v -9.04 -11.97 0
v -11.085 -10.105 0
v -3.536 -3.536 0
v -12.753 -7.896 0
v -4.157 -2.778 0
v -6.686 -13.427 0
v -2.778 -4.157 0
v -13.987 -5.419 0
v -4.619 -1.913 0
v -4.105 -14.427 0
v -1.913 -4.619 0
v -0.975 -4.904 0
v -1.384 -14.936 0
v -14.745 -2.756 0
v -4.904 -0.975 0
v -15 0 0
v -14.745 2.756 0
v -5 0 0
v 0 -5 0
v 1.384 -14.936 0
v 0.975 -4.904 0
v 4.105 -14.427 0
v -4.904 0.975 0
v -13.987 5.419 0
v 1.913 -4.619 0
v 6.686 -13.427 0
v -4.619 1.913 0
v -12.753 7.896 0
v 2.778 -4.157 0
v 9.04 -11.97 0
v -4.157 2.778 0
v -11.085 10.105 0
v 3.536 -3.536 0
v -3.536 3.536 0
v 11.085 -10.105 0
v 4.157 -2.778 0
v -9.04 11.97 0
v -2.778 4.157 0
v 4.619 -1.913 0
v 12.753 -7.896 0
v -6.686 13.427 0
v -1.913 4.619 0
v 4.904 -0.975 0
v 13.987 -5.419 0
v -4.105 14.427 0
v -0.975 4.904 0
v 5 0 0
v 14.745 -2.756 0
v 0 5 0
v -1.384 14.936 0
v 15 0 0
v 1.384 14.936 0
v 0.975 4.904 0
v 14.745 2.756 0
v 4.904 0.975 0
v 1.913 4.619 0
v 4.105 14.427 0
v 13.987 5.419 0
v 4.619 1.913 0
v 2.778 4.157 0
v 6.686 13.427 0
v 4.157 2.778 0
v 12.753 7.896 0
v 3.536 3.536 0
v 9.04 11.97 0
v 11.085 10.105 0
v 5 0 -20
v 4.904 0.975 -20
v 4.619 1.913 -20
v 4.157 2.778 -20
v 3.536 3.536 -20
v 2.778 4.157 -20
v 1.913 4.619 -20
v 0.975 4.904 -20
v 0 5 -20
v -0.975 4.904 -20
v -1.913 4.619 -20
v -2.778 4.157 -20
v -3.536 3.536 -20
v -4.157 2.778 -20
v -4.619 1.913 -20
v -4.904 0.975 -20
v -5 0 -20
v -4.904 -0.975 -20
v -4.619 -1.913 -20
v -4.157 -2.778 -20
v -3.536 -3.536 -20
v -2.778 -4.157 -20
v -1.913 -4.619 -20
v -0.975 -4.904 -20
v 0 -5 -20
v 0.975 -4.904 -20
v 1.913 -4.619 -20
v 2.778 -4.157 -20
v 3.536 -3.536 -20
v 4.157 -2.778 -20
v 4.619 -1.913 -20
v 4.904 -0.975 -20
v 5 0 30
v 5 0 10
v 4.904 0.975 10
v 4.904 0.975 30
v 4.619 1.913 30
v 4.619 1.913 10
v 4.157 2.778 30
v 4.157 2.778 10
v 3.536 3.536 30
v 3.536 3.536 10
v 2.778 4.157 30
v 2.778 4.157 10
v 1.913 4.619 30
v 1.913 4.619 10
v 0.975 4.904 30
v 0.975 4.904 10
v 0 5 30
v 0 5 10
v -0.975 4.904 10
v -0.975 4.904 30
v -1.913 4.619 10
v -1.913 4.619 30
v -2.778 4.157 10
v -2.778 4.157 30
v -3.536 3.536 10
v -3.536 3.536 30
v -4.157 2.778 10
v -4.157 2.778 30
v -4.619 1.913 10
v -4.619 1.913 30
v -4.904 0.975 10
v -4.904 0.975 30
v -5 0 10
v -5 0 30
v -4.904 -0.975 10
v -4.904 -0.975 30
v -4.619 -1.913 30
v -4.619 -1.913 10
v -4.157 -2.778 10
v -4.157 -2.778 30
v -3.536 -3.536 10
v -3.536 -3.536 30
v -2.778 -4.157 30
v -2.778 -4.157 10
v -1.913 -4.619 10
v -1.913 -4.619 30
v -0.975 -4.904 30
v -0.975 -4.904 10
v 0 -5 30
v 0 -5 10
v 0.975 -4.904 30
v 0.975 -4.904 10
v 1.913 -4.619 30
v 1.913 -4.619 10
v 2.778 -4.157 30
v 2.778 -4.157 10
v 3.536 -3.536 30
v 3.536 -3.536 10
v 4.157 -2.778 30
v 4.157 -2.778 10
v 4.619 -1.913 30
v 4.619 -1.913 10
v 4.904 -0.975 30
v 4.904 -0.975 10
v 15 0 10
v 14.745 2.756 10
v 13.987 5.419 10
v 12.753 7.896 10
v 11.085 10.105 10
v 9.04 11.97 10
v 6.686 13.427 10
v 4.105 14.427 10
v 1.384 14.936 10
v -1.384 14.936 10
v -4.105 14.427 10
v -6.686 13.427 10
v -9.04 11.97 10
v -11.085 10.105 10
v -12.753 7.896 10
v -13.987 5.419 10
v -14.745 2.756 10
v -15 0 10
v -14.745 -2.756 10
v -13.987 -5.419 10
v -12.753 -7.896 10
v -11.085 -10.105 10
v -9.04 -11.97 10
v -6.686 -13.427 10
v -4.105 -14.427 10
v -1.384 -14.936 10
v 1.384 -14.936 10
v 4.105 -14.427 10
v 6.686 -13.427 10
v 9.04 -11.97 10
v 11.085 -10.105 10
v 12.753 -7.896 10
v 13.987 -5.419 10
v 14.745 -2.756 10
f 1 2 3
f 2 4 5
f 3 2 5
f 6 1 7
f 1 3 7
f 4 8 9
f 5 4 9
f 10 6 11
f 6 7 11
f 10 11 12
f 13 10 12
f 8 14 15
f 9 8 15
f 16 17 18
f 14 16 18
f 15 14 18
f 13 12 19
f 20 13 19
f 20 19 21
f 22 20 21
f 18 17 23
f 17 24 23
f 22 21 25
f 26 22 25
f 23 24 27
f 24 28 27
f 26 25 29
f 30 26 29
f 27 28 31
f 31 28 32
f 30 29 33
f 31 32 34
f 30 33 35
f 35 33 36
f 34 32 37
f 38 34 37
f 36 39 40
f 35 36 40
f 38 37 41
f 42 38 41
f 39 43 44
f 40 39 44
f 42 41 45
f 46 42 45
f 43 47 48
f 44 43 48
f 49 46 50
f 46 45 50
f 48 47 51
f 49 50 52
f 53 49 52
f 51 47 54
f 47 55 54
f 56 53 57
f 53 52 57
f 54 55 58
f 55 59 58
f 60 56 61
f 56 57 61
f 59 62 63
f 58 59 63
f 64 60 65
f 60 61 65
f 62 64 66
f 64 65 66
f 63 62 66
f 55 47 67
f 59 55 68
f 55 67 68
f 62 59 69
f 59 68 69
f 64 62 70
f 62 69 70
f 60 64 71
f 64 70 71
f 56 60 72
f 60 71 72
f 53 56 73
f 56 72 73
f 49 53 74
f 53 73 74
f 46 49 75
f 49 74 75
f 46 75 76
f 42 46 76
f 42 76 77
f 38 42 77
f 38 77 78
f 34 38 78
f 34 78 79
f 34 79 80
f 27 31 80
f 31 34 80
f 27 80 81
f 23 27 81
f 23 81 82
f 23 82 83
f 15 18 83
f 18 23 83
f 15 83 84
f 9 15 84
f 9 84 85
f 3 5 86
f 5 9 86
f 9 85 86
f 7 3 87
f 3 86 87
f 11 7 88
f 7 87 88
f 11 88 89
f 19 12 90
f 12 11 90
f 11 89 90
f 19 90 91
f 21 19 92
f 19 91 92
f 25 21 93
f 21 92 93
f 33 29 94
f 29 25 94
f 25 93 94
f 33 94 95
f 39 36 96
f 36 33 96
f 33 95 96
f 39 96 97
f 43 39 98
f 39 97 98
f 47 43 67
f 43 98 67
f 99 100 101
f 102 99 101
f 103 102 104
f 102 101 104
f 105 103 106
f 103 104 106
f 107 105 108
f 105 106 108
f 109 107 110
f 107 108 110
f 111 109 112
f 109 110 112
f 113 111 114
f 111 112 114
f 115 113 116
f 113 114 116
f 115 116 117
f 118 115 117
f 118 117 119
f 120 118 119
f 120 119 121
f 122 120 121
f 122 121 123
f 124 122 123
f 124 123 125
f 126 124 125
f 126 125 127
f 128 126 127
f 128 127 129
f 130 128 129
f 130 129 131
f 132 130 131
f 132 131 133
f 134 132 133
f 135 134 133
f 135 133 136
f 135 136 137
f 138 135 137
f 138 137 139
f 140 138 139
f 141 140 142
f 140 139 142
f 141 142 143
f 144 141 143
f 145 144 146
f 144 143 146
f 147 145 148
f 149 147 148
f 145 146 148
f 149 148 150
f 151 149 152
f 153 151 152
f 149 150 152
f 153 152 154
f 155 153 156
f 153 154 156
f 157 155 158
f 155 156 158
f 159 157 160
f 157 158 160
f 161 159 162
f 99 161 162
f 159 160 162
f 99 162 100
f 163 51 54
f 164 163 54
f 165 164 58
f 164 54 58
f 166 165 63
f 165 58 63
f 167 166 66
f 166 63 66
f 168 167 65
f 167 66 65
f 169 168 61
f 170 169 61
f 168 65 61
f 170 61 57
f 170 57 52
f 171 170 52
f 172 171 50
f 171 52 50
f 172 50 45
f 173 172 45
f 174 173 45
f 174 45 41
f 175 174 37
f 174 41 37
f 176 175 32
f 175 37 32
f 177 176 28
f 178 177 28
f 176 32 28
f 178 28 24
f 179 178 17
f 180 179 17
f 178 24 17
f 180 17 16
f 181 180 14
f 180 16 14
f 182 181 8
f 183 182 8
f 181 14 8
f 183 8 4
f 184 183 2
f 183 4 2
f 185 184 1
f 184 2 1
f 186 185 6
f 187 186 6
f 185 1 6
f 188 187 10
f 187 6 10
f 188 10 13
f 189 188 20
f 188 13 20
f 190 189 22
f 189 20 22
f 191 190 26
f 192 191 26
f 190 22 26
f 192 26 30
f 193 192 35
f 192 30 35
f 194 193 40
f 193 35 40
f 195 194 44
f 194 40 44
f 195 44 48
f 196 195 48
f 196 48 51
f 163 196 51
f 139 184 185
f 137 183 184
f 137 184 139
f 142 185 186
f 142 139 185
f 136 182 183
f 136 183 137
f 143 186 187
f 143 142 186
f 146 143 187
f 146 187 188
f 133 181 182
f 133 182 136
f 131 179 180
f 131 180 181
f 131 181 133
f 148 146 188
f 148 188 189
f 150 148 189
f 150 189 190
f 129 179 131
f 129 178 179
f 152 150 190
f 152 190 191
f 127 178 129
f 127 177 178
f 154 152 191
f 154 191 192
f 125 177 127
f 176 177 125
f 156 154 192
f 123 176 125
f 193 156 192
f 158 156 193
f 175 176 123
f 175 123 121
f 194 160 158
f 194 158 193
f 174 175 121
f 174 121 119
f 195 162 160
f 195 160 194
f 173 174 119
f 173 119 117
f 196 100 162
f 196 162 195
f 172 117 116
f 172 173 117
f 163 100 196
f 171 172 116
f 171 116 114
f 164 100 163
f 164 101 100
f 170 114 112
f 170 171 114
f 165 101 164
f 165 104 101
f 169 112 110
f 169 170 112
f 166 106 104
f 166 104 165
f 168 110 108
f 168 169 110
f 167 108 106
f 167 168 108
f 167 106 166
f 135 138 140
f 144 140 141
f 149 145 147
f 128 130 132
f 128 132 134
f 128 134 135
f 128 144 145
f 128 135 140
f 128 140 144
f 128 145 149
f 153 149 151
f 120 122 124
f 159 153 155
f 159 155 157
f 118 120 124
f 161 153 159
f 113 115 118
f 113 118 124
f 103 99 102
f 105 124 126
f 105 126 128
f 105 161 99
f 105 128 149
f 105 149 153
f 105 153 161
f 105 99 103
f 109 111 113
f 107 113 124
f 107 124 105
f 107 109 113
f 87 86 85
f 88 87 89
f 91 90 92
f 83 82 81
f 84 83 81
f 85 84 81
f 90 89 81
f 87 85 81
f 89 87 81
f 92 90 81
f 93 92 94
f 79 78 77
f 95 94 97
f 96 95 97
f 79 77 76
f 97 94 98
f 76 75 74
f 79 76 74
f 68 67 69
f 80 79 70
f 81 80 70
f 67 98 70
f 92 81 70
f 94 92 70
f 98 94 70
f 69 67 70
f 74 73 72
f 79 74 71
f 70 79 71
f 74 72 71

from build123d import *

# Parameters (mm, degrees)
SKETCH1_R                = 15
BOSS_EXTRUDE1_DEPTH      = 10
BOSS_EXTRUDE2_DEPTH      = 30
BOSS_EXTRUDE2_DEPTH_BACK = 20
SKETCH2_R                = 5


with BuildPart() as part:
    # Sketch1 → Boss-Extrude1 (new body)
    with BuildSketch(Plane.XY):
        Circle(SKETCH1_R)
    extrude(amount=BOSS_EXTRUDE1_DEPTH)

    # Sketch2 → Boss-Extrude2 (add, two sides: drawn at the far end of the back side and taken through both)
    with BuildSketch(Plane.XY.offset(-BOSS_EXTRUDE2_DEPTH_BACK)):
        Circle(SKETCH2_R)
    extrude(amount=BOSS_EXTRUDE2_DEPTH + BOSS_EXTRUDE2_DEPTH_BACK)


solid = part.part
